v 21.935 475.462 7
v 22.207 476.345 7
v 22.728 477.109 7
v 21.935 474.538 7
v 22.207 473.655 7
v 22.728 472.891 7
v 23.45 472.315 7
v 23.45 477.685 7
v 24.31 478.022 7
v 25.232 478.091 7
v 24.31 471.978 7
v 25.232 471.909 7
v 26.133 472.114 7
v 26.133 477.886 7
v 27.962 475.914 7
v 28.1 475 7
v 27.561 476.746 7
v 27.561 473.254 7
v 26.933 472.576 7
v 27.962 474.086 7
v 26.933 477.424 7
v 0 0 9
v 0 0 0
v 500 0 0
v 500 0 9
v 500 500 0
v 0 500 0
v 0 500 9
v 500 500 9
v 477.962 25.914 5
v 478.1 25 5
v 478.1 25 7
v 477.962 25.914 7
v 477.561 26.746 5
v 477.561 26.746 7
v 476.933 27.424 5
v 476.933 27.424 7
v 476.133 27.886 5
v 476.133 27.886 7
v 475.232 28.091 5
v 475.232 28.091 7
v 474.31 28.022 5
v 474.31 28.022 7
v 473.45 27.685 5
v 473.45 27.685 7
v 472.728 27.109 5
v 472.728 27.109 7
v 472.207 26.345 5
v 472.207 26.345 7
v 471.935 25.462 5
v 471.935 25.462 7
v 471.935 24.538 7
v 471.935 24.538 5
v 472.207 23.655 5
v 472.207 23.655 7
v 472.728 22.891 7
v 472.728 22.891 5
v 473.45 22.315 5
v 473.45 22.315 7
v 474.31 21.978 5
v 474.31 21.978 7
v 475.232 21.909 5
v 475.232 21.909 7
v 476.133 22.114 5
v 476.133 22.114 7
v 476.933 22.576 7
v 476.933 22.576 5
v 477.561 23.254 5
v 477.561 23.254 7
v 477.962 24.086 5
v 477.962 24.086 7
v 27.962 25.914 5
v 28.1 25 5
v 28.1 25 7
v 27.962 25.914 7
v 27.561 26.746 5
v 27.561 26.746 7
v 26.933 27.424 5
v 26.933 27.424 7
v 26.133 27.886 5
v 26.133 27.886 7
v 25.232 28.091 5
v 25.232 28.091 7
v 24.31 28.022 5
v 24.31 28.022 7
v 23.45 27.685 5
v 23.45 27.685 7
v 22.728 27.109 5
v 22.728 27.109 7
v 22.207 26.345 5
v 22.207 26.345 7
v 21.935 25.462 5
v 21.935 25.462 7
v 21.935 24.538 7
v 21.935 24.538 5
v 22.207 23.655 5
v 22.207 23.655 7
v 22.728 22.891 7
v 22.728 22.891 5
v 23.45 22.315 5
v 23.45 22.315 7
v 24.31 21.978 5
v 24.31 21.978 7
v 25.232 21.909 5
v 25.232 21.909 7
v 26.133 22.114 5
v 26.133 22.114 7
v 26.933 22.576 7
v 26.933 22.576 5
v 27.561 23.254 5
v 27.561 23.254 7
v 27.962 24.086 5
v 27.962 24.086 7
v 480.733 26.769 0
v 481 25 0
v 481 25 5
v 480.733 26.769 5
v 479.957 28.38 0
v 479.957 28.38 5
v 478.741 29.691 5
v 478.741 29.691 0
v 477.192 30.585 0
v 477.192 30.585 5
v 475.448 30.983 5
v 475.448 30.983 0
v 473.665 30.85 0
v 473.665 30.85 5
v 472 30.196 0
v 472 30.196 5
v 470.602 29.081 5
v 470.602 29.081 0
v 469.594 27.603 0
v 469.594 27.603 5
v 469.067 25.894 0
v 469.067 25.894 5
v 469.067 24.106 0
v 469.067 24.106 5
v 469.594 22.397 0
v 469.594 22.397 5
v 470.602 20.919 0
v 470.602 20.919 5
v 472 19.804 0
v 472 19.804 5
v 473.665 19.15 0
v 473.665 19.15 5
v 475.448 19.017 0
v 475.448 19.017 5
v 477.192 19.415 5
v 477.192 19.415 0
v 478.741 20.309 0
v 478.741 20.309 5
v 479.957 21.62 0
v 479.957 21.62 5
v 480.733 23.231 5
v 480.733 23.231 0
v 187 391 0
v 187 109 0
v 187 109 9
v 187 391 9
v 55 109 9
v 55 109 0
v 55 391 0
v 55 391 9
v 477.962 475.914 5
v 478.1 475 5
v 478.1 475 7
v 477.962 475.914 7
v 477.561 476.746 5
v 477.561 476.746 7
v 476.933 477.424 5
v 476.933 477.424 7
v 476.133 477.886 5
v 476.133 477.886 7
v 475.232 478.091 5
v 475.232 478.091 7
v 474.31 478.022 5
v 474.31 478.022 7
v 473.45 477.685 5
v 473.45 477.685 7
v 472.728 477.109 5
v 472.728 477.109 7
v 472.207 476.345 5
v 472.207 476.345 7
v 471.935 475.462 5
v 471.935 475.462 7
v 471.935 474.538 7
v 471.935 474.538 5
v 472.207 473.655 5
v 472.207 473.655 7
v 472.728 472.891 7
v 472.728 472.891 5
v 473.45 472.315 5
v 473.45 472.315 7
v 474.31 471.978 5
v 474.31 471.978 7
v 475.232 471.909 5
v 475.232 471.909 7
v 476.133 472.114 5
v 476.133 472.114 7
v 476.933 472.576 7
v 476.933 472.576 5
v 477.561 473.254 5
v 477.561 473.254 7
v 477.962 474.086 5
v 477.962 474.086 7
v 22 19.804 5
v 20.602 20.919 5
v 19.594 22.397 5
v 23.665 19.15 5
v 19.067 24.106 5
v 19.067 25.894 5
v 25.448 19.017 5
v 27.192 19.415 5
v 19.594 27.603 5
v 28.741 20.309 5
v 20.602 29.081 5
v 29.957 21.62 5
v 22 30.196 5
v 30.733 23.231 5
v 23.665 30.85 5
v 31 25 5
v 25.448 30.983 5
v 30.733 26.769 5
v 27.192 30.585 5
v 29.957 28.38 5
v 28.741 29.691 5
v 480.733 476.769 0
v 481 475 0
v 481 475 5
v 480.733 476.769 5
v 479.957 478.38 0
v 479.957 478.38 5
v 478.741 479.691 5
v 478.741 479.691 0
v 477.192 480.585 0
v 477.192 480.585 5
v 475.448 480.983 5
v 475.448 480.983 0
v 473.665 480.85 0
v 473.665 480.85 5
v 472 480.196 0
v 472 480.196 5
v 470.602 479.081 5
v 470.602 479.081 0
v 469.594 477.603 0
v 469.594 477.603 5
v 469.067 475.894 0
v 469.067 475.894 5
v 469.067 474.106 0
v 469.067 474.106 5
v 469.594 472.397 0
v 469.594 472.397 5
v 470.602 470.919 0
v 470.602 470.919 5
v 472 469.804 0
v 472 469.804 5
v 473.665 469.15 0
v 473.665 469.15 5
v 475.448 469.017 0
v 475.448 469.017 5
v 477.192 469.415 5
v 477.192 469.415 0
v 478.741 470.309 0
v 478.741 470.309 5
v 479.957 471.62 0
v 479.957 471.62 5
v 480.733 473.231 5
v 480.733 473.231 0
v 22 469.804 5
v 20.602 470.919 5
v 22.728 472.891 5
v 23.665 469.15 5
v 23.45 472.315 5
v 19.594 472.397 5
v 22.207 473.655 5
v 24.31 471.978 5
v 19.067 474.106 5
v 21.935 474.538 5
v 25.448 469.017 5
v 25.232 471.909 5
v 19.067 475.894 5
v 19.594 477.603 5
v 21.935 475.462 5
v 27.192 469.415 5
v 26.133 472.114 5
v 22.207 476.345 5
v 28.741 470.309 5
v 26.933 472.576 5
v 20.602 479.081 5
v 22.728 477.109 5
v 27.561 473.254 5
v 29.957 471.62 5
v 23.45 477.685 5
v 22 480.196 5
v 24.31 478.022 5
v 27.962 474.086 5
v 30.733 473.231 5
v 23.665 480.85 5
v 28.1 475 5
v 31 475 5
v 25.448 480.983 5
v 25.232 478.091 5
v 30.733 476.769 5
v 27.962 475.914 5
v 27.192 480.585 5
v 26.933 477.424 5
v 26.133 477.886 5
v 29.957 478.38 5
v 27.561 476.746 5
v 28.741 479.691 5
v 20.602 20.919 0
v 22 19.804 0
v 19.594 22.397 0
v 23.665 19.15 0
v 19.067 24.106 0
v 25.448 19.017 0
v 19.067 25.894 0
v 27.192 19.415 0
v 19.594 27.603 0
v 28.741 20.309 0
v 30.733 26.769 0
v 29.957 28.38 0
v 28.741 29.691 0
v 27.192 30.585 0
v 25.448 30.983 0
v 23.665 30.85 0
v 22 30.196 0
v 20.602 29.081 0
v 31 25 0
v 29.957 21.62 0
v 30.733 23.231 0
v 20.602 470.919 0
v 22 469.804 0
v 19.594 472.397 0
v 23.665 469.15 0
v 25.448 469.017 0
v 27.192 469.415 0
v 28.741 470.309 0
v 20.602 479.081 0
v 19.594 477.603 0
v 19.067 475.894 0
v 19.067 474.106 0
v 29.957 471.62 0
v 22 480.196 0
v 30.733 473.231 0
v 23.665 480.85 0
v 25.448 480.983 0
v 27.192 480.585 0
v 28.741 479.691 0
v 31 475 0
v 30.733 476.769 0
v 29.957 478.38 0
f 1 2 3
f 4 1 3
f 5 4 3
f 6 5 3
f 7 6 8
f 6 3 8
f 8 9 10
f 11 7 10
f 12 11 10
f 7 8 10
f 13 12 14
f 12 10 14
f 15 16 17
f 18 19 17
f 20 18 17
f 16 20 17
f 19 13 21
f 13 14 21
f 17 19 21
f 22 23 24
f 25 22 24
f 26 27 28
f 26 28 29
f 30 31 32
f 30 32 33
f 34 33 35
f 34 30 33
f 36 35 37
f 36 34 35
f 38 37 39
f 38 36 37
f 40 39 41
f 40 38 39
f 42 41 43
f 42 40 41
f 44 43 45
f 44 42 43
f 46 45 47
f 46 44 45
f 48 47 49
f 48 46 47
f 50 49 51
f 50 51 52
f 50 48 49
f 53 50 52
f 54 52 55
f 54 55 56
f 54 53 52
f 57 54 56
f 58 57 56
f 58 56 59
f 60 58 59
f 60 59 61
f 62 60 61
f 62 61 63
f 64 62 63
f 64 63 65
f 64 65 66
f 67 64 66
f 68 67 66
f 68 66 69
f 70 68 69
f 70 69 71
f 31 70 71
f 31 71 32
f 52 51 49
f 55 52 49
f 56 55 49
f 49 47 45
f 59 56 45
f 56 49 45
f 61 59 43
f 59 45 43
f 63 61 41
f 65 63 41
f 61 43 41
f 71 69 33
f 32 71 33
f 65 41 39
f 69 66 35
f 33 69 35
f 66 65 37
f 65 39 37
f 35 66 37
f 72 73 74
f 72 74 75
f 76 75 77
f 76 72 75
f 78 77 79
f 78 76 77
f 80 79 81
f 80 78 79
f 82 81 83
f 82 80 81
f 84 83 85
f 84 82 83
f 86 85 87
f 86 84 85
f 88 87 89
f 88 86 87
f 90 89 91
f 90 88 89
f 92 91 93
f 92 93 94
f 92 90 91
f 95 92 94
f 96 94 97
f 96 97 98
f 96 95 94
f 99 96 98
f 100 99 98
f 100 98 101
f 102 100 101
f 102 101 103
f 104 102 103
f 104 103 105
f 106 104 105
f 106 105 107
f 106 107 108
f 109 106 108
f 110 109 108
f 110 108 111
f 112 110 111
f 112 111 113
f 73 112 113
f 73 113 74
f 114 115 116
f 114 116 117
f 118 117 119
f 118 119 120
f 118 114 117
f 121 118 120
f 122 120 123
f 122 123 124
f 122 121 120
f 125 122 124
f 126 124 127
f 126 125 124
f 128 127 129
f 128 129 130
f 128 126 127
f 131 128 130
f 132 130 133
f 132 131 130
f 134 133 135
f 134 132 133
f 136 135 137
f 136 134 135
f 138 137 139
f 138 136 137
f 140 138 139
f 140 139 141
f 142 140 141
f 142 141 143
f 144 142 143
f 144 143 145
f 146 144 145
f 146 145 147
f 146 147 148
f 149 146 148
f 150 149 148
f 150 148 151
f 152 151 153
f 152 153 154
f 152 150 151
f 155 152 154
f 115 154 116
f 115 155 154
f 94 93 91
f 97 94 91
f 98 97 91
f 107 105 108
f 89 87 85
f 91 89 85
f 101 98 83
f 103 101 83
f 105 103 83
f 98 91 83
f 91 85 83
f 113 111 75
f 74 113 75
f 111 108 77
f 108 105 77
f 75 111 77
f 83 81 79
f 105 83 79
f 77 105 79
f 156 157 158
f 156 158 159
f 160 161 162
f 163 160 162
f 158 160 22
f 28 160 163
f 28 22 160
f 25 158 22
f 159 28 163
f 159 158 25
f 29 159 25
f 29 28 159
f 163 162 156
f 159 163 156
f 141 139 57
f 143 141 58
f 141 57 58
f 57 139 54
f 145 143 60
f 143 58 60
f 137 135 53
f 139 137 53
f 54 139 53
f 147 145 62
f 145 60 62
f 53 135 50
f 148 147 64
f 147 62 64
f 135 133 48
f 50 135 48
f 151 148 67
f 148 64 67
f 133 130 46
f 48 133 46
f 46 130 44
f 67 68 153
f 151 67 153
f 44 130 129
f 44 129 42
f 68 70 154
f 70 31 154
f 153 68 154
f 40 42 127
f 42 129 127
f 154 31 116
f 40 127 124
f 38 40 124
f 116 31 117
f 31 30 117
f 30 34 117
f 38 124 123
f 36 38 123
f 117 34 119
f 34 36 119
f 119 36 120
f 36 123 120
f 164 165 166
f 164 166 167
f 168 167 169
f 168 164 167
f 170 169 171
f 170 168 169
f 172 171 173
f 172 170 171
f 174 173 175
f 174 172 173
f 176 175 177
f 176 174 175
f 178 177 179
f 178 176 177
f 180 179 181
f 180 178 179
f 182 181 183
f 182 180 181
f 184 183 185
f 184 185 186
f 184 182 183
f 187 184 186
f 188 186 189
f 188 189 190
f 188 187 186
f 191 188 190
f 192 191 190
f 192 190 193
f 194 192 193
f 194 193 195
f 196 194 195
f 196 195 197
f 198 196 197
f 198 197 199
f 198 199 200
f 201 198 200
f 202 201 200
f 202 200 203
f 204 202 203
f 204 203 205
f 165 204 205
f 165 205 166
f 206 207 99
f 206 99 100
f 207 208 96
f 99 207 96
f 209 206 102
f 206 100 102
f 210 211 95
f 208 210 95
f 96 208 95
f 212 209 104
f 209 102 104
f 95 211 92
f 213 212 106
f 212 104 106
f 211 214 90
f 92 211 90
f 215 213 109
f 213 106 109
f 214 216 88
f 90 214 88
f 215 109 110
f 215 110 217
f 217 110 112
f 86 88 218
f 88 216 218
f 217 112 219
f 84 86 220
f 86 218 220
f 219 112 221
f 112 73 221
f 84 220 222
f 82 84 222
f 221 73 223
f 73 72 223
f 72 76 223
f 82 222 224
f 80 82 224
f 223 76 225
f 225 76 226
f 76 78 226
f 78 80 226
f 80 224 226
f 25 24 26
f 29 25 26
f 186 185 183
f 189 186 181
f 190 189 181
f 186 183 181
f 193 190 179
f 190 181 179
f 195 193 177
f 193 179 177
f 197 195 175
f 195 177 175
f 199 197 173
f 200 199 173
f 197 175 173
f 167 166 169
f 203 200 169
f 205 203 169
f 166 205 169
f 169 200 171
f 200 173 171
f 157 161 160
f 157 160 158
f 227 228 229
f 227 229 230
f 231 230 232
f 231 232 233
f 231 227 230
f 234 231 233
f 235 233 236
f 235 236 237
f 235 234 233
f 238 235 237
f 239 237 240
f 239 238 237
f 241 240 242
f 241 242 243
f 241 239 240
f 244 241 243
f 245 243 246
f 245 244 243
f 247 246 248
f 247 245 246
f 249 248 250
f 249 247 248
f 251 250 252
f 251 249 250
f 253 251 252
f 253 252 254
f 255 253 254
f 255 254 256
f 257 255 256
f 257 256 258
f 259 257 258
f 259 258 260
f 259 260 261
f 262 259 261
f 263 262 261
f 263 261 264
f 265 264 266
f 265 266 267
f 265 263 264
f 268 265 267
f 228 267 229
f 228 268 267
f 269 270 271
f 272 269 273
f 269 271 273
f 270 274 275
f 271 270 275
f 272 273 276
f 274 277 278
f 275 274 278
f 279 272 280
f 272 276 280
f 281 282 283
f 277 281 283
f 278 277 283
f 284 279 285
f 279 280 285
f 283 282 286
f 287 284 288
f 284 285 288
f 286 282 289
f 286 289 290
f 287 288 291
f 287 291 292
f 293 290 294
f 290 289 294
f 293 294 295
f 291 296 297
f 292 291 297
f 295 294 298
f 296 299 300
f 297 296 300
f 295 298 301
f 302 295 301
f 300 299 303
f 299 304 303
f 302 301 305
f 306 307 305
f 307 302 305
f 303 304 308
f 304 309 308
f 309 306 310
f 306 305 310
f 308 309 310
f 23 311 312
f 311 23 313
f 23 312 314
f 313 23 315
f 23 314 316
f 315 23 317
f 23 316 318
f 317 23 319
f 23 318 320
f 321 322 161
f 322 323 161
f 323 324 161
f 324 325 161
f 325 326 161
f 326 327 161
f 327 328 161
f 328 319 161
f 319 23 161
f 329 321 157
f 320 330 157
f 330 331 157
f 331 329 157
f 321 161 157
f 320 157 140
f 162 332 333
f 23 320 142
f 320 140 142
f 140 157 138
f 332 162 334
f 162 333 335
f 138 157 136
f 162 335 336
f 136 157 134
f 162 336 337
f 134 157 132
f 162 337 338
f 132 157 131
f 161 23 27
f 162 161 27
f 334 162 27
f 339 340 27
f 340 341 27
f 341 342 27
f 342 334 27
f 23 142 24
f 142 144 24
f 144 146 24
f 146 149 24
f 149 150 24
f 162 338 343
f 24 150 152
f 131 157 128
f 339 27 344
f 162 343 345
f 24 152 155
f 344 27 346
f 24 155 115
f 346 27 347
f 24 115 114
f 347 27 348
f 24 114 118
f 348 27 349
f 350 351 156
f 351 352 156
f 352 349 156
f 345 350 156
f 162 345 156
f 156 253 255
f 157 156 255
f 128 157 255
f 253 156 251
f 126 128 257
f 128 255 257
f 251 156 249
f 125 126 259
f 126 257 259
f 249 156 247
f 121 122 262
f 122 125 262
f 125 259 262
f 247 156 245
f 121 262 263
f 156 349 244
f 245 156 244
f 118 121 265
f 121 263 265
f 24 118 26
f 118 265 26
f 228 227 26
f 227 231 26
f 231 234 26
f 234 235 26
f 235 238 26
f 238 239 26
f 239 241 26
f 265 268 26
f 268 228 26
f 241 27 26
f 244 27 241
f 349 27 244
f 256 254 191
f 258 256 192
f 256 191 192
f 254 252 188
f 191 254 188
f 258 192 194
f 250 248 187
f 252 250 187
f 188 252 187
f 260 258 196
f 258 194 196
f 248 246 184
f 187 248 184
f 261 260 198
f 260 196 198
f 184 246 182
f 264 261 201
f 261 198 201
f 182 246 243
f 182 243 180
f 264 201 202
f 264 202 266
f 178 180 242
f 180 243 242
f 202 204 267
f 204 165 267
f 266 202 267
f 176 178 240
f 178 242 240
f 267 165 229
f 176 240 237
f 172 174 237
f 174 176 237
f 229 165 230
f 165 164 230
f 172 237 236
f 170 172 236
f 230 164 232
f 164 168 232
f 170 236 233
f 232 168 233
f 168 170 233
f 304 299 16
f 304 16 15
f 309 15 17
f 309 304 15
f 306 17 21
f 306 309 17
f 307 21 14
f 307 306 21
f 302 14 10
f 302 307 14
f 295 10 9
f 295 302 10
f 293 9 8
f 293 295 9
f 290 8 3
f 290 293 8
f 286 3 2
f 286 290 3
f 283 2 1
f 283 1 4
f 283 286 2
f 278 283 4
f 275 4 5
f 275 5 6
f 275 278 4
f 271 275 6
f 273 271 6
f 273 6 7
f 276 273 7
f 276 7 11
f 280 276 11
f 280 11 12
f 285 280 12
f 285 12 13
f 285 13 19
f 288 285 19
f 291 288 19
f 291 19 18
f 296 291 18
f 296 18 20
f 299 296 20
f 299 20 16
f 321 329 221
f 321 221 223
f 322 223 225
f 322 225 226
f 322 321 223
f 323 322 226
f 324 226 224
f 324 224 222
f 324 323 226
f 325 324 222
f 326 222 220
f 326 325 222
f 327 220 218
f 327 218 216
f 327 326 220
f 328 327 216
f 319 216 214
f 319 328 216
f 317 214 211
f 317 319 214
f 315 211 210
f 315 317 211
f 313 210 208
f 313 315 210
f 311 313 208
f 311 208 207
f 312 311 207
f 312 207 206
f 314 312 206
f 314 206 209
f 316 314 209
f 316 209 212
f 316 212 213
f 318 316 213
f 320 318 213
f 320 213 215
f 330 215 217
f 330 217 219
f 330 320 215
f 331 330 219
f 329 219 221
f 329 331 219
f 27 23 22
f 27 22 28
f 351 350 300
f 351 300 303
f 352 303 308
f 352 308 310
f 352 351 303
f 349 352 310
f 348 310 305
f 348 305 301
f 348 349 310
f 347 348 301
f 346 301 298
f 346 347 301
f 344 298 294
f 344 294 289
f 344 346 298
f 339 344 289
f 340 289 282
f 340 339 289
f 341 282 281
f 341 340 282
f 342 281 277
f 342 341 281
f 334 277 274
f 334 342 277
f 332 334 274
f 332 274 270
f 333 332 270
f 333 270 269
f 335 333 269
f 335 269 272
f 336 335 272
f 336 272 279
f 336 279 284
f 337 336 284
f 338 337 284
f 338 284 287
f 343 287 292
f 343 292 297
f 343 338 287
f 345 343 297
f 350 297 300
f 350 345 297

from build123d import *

# Parameters (mm, degrees)
F0_W     = 500
F0_H     = 500
F0_R     = 6
F0_W_2   = 132
F0_H_2   = 282
F0_R_2   = 3.1
F1_DEPTH = 9
F2_DEPTH = 7
F3_DEPTH = 5
F4_DEPTH = 25


with BuildPart() as f1:
    # F0 (on Top) → F1 (new body)
    with BuildSketch(Plane.XY):
        with Locations((250, 250)):
            Rectangle(F0_W, F0_H)
        with Locations((25, 25)):
            Circle(F0_R, mode=Mode.SUBTRACT)
        with Locations((475, 25)):
            Circle(F0_R, mode=Mode.SUBTRACT)
        with Locations((121, 250)):
            Rectangle(F0_W_2, F0_H_2, mode=Mode.SUBTRACT)
        with Locations((25, 475)):
            Circle(F0_R, mode=Mode.SUBTRACT)
        with Locations((475, 475)):
            Circle(F0_R, mode=Mode.SUBTRACT)
        with Locations((121, 250)):
            Rectangle(F0_W_2, F0_H_2)
        with Locations((475, 25)):
            Circle(F0_R)
        with Locations((475, 25)):
            Circle(F0_R_2, mode=Mode.SUBTRACT)
        with Locations((25, 25)):
            Circle(F0_R)
        with Locations((25, 25)):
            Circle(F0_R_2, mode=Mode.SUBTRACT)
        with Locations((25, 475)):
            Circle(F0_R)
        with Locations((25, 475)):
            Circle(F0_R_2, mode=Mode.SUBTRACT)
        with Locations((475, 475)):
            Circle(F0_R)
        with Locations((475, 475)):
            Circle(F0_R_2, mode=Mode.SUBTRACT)
        with Locations((475, 25)):
            Circle(F0_R_2)
        with Locations((475, 475)):
            Circle(F0_R_2)
        with Locations((25, 475)):
            Circle(F0_R_2)
        with Locations((25, 25)):
            Circle(F0_R_2)
    extrude(amount=F1_DEPTH)

    # F0 (on Top) → F2 (cut)
    with BuildSketch(Plane.XY):
        with Locations((475, 25)):
            Circle(F0_R_2)
        with Locations((475, 475)):
            Circle(F0_R_2)
        with Locations((25, 475)):
            Circle(F0_R_2)
        with Locations((25, 25)):
            Circle(F0_R_2)
    extrude(amount=F2_DEPTH, mode=Mode.SUBTRACT)

    # F0 (on Top) → F3 (cut)
    with BuildSketch(Plane.XY):
        with Locations((475, 475)):
            Circle(F0_R)
        with Locations((475, 475)):
            Circle(F0_R_2, mode=Mode.SUBTRACT)
        with Locations((25, 475)):
            Circle(F0_R)
        with Locations((25, 475)):
            Circle(F0_R_2, mode=Mode.SUBTRACT)
        with Locations((25, 25)):
            Circle(F0_R)
        with Locations((25, 25)):
            Circle(F0_R_2, mode=Mode.SUBTRACT)
        with Locations((475, 25)):
            Circle(F0_R)
        with Locations((475, 25)):
            Circle(F0_R_2, mode=Mode.SUBTRACT)
    extrude(amount=F3_DEPTH, mode=Mode.SUBTRACT)

    # F0 (on Top) → F4 (cut)
    with BuildSketch(Plane.XY):
        with Locations((121, 250)):
            Rectangle(F0_W_2, F0_H_2)
    extrude(amount=F4_DEPTH, mode=Mode.SUBTRACT)


solid = f1.part
